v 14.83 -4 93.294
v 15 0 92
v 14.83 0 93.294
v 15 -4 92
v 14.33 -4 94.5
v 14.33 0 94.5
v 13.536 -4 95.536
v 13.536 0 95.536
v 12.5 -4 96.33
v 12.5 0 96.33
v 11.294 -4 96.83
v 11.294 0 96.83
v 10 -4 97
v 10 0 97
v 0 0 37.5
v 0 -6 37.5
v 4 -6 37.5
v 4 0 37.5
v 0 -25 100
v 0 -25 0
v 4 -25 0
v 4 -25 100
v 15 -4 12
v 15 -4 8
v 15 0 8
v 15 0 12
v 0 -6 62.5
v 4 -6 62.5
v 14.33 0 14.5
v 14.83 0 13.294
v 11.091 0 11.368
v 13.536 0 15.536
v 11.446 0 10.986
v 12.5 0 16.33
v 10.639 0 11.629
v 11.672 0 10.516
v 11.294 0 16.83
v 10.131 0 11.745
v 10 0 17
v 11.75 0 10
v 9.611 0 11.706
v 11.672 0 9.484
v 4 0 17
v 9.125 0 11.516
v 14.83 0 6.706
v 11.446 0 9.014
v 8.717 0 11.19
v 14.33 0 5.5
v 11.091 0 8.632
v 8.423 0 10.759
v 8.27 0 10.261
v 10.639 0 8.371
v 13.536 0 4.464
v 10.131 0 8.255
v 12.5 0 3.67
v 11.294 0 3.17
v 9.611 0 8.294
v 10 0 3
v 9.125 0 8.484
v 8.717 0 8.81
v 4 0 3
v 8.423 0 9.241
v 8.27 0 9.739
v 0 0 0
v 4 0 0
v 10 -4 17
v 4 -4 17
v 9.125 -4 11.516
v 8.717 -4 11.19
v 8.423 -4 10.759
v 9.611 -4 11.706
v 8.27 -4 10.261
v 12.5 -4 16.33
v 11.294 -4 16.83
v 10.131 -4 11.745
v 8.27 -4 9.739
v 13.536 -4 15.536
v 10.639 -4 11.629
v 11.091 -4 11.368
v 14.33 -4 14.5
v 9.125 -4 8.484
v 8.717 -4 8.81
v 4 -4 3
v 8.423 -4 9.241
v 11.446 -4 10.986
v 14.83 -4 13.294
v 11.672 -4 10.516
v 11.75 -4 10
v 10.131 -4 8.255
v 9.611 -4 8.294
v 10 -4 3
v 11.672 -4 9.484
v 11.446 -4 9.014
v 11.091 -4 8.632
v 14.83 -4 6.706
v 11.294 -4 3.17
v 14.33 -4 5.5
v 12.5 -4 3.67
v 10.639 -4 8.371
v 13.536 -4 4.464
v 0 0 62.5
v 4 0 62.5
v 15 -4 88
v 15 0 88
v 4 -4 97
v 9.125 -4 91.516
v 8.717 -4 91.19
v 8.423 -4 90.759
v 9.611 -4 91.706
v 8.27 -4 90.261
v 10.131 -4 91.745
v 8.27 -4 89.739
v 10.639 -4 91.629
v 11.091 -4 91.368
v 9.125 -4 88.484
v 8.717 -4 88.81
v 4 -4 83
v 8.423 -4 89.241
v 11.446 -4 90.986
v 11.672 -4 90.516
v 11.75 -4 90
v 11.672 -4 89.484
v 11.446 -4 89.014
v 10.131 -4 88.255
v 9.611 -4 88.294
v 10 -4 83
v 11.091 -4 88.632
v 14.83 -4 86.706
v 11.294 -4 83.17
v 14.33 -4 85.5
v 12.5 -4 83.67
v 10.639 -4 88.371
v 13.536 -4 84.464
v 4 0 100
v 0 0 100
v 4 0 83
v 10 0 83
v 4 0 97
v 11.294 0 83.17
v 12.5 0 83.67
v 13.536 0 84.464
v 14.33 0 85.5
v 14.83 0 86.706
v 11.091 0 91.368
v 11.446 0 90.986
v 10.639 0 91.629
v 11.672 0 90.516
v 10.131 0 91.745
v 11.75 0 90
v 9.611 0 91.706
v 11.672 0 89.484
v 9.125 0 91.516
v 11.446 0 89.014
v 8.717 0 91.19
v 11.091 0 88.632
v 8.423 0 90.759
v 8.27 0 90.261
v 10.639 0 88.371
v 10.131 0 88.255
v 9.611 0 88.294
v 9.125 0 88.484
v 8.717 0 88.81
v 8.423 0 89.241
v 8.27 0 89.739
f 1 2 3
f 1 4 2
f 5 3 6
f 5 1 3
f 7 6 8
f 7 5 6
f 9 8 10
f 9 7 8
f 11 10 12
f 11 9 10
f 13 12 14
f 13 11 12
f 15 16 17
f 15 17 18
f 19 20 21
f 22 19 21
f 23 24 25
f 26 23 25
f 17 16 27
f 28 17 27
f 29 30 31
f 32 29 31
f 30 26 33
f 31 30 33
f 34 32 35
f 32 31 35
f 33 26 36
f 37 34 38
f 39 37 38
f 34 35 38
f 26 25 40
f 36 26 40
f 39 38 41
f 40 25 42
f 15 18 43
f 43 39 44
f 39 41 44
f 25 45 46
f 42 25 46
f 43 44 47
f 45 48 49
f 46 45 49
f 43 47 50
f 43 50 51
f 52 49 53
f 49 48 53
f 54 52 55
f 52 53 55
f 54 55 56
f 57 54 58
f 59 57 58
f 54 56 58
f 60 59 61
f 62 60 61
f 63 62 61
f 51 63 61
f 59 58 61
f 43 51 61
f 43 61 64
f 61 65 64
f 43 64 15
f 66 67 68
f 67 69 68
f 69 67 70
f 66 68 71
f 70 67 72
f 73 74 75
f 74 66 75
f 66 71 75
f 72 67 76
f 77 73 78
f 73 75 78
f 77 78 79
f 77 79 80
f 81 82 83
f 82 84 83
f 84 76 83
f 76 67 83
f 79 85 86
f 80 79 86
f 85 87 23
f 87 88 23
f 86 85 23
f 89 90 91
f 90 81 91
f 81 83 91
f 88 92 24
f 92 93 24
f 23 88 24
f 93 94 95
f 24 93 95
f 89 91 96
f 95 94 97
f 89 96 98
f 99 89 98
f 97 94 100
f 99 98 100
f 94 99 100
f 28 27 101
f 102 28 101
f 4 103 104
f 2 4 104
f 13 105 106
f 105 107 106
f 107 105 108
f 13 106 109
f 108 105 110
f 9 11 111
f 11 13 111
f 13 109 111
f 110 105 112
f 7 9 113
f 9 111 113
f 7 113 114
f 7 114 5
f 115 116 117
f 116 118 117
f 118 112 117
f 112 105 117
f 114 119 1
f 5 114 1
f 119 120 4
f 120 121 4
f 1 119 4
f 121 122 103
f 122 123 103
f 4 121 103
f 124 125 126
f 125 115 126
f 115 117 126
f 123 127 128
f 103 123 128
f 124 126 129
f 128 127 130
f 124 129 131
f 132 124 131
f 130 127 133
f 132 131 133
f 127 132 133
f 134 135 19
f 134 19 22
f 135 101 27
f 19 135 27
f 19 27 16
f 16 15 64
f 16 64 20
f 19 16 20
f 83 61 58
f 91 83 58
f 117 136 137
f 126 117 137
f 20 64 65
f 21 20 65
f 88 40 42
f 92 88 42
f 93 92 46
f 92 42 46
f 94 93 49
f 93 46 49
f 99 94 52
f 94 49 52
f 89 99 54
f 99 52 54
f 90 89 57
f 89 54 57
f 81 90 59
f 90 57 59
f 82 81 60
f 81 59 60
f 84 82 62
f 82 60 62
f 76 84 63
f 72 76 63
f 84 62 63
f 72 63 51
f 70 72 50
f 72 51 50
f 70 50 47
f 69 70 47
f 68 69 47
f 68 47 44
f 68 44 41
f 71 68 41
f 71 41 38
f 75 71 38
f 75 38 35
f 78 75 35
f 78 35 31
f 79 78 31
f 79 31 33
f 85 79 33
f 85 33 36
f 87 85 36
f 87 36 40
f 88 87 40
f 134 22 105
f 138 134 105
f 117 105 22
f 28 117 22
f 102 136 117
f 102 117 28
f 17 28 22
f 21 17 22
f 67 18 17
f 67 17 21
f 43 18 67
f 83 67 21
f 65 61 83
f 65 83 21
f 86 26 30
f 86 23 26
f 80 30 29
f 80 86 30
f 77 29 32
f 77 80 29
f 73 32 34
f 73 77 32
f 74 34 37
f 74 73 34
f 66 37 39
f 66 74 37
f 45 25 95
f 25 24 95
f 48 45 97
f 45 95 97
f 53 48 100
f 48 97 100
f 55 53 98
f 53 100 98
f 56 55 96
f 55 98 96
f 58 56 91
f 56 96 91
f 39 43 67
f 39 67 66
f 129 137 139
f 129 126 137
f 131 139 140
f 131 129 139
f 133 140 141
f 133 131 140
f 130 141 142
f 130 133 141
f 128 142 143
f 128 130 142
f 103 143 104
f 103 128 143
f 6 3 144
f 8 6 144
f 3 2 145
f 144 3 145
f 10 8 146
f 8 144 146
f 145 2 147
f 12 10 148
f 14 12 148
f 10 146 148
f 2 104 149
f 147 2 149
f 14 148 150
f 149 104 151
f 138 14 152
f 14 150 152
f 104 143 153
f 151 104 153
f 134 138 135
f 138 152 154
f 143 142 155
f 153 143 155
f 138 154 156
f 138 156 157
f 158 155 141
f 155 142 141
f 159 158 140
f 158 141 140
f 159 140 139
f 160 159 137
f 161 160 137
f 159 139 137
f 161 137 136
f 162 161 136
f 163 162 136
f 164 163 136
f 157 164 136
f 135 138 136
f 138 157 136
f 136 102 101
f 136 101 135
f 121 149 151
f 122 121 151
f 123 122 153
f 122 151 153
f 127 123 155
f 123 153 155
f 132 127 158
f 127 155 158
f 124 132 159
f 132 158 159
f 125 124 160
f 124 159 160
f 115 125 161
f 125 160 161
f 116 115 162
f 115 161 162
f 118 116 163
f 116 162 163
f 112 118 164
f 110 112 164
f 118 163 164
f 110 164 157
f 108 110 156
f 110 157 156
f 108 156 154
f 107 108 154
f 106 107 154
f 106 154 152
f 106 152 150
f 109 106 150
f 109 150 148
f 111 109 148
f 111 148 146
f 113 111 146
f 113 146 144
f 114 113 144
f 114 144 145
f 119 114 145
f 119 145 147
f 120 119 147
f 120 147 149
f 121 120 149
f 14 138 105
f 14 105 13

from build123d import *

# Parameters (mm, degrees)
RESSALTO_EXTRUS_O1_DEPTH = 100
ESBO_O2_R                = 1.75
ESBO_O2_W                = 11
ESBO_O2_H                = 3
ESBO_O2_H_2              = 66
CORTE_EXTRUS_O1_DEPTH    = 100
FILETE1_R                = 5
ESBO_O3_W                = 25
ESBO_O3_H                = 12
CORTE_EXTRUS_O2_DEPTH    = 100


with BuildPart() as part:
    # Esboço1 → Ressalto-extrusão1 (new body)
    with BuildSketch(Plane.XY):
        Polygon((15, 0), (0, 0), (0, -25), (4, -25), (4, -4), (15, -4), align=None)
    extrude(amount=RESSALTO_EXTRUS_O1_DEPTH)

    # Esboço2 → Corte-extrusão1 (cut)
    with BuildSketch(Plane(origin=(0, 0, 0), x_dir=(1, 0, 0), z_dir=(0, 1, 0))):
        with Locations((10, -10)):
            Circle(ESBO_O2_R)
        with Locations((10, -90)):
            Circle(ESBO_O2_R)
        with Locations((9.5, -1.5)):
            Rectangle(ESBO_O2_W, ESBO_O2_H)
        with Locations((9.5, -50)):
            Rectangle(ESBO_O2_W, ESBO_O2_H_2)
        with Locations((9.5, -98.5)):
            Rectangle(ESBO_O2_W, ESBO_O2_H)
    extrude(amount=-CORTE_EXTRUS_O1_DEPTH, mode=Mode.SUBTRACT)

    # Filete1
    filete1_edges = [part.edges().sort_by_distance(p)[0] for p in [
        (15, -2, 97),
        (15, -2, 3),
        (15, -2, 17),
        (15, -2, 83),
    ]]
    fillet(filete1_edges, radius=FILETE1_R)

    # Esboço3 → Corte-extrusão2 (cut)
    with BuildSketch(Plane.ZY):
        with Locations((50, 0)):
            Rectangle(ESBO_O3_W, ESBO_O3_H)
    extrude(amount=-CORTE_EXTRUS_O2_DEPTH, mode=Mode.SUBTRACT)


solid = part.part
